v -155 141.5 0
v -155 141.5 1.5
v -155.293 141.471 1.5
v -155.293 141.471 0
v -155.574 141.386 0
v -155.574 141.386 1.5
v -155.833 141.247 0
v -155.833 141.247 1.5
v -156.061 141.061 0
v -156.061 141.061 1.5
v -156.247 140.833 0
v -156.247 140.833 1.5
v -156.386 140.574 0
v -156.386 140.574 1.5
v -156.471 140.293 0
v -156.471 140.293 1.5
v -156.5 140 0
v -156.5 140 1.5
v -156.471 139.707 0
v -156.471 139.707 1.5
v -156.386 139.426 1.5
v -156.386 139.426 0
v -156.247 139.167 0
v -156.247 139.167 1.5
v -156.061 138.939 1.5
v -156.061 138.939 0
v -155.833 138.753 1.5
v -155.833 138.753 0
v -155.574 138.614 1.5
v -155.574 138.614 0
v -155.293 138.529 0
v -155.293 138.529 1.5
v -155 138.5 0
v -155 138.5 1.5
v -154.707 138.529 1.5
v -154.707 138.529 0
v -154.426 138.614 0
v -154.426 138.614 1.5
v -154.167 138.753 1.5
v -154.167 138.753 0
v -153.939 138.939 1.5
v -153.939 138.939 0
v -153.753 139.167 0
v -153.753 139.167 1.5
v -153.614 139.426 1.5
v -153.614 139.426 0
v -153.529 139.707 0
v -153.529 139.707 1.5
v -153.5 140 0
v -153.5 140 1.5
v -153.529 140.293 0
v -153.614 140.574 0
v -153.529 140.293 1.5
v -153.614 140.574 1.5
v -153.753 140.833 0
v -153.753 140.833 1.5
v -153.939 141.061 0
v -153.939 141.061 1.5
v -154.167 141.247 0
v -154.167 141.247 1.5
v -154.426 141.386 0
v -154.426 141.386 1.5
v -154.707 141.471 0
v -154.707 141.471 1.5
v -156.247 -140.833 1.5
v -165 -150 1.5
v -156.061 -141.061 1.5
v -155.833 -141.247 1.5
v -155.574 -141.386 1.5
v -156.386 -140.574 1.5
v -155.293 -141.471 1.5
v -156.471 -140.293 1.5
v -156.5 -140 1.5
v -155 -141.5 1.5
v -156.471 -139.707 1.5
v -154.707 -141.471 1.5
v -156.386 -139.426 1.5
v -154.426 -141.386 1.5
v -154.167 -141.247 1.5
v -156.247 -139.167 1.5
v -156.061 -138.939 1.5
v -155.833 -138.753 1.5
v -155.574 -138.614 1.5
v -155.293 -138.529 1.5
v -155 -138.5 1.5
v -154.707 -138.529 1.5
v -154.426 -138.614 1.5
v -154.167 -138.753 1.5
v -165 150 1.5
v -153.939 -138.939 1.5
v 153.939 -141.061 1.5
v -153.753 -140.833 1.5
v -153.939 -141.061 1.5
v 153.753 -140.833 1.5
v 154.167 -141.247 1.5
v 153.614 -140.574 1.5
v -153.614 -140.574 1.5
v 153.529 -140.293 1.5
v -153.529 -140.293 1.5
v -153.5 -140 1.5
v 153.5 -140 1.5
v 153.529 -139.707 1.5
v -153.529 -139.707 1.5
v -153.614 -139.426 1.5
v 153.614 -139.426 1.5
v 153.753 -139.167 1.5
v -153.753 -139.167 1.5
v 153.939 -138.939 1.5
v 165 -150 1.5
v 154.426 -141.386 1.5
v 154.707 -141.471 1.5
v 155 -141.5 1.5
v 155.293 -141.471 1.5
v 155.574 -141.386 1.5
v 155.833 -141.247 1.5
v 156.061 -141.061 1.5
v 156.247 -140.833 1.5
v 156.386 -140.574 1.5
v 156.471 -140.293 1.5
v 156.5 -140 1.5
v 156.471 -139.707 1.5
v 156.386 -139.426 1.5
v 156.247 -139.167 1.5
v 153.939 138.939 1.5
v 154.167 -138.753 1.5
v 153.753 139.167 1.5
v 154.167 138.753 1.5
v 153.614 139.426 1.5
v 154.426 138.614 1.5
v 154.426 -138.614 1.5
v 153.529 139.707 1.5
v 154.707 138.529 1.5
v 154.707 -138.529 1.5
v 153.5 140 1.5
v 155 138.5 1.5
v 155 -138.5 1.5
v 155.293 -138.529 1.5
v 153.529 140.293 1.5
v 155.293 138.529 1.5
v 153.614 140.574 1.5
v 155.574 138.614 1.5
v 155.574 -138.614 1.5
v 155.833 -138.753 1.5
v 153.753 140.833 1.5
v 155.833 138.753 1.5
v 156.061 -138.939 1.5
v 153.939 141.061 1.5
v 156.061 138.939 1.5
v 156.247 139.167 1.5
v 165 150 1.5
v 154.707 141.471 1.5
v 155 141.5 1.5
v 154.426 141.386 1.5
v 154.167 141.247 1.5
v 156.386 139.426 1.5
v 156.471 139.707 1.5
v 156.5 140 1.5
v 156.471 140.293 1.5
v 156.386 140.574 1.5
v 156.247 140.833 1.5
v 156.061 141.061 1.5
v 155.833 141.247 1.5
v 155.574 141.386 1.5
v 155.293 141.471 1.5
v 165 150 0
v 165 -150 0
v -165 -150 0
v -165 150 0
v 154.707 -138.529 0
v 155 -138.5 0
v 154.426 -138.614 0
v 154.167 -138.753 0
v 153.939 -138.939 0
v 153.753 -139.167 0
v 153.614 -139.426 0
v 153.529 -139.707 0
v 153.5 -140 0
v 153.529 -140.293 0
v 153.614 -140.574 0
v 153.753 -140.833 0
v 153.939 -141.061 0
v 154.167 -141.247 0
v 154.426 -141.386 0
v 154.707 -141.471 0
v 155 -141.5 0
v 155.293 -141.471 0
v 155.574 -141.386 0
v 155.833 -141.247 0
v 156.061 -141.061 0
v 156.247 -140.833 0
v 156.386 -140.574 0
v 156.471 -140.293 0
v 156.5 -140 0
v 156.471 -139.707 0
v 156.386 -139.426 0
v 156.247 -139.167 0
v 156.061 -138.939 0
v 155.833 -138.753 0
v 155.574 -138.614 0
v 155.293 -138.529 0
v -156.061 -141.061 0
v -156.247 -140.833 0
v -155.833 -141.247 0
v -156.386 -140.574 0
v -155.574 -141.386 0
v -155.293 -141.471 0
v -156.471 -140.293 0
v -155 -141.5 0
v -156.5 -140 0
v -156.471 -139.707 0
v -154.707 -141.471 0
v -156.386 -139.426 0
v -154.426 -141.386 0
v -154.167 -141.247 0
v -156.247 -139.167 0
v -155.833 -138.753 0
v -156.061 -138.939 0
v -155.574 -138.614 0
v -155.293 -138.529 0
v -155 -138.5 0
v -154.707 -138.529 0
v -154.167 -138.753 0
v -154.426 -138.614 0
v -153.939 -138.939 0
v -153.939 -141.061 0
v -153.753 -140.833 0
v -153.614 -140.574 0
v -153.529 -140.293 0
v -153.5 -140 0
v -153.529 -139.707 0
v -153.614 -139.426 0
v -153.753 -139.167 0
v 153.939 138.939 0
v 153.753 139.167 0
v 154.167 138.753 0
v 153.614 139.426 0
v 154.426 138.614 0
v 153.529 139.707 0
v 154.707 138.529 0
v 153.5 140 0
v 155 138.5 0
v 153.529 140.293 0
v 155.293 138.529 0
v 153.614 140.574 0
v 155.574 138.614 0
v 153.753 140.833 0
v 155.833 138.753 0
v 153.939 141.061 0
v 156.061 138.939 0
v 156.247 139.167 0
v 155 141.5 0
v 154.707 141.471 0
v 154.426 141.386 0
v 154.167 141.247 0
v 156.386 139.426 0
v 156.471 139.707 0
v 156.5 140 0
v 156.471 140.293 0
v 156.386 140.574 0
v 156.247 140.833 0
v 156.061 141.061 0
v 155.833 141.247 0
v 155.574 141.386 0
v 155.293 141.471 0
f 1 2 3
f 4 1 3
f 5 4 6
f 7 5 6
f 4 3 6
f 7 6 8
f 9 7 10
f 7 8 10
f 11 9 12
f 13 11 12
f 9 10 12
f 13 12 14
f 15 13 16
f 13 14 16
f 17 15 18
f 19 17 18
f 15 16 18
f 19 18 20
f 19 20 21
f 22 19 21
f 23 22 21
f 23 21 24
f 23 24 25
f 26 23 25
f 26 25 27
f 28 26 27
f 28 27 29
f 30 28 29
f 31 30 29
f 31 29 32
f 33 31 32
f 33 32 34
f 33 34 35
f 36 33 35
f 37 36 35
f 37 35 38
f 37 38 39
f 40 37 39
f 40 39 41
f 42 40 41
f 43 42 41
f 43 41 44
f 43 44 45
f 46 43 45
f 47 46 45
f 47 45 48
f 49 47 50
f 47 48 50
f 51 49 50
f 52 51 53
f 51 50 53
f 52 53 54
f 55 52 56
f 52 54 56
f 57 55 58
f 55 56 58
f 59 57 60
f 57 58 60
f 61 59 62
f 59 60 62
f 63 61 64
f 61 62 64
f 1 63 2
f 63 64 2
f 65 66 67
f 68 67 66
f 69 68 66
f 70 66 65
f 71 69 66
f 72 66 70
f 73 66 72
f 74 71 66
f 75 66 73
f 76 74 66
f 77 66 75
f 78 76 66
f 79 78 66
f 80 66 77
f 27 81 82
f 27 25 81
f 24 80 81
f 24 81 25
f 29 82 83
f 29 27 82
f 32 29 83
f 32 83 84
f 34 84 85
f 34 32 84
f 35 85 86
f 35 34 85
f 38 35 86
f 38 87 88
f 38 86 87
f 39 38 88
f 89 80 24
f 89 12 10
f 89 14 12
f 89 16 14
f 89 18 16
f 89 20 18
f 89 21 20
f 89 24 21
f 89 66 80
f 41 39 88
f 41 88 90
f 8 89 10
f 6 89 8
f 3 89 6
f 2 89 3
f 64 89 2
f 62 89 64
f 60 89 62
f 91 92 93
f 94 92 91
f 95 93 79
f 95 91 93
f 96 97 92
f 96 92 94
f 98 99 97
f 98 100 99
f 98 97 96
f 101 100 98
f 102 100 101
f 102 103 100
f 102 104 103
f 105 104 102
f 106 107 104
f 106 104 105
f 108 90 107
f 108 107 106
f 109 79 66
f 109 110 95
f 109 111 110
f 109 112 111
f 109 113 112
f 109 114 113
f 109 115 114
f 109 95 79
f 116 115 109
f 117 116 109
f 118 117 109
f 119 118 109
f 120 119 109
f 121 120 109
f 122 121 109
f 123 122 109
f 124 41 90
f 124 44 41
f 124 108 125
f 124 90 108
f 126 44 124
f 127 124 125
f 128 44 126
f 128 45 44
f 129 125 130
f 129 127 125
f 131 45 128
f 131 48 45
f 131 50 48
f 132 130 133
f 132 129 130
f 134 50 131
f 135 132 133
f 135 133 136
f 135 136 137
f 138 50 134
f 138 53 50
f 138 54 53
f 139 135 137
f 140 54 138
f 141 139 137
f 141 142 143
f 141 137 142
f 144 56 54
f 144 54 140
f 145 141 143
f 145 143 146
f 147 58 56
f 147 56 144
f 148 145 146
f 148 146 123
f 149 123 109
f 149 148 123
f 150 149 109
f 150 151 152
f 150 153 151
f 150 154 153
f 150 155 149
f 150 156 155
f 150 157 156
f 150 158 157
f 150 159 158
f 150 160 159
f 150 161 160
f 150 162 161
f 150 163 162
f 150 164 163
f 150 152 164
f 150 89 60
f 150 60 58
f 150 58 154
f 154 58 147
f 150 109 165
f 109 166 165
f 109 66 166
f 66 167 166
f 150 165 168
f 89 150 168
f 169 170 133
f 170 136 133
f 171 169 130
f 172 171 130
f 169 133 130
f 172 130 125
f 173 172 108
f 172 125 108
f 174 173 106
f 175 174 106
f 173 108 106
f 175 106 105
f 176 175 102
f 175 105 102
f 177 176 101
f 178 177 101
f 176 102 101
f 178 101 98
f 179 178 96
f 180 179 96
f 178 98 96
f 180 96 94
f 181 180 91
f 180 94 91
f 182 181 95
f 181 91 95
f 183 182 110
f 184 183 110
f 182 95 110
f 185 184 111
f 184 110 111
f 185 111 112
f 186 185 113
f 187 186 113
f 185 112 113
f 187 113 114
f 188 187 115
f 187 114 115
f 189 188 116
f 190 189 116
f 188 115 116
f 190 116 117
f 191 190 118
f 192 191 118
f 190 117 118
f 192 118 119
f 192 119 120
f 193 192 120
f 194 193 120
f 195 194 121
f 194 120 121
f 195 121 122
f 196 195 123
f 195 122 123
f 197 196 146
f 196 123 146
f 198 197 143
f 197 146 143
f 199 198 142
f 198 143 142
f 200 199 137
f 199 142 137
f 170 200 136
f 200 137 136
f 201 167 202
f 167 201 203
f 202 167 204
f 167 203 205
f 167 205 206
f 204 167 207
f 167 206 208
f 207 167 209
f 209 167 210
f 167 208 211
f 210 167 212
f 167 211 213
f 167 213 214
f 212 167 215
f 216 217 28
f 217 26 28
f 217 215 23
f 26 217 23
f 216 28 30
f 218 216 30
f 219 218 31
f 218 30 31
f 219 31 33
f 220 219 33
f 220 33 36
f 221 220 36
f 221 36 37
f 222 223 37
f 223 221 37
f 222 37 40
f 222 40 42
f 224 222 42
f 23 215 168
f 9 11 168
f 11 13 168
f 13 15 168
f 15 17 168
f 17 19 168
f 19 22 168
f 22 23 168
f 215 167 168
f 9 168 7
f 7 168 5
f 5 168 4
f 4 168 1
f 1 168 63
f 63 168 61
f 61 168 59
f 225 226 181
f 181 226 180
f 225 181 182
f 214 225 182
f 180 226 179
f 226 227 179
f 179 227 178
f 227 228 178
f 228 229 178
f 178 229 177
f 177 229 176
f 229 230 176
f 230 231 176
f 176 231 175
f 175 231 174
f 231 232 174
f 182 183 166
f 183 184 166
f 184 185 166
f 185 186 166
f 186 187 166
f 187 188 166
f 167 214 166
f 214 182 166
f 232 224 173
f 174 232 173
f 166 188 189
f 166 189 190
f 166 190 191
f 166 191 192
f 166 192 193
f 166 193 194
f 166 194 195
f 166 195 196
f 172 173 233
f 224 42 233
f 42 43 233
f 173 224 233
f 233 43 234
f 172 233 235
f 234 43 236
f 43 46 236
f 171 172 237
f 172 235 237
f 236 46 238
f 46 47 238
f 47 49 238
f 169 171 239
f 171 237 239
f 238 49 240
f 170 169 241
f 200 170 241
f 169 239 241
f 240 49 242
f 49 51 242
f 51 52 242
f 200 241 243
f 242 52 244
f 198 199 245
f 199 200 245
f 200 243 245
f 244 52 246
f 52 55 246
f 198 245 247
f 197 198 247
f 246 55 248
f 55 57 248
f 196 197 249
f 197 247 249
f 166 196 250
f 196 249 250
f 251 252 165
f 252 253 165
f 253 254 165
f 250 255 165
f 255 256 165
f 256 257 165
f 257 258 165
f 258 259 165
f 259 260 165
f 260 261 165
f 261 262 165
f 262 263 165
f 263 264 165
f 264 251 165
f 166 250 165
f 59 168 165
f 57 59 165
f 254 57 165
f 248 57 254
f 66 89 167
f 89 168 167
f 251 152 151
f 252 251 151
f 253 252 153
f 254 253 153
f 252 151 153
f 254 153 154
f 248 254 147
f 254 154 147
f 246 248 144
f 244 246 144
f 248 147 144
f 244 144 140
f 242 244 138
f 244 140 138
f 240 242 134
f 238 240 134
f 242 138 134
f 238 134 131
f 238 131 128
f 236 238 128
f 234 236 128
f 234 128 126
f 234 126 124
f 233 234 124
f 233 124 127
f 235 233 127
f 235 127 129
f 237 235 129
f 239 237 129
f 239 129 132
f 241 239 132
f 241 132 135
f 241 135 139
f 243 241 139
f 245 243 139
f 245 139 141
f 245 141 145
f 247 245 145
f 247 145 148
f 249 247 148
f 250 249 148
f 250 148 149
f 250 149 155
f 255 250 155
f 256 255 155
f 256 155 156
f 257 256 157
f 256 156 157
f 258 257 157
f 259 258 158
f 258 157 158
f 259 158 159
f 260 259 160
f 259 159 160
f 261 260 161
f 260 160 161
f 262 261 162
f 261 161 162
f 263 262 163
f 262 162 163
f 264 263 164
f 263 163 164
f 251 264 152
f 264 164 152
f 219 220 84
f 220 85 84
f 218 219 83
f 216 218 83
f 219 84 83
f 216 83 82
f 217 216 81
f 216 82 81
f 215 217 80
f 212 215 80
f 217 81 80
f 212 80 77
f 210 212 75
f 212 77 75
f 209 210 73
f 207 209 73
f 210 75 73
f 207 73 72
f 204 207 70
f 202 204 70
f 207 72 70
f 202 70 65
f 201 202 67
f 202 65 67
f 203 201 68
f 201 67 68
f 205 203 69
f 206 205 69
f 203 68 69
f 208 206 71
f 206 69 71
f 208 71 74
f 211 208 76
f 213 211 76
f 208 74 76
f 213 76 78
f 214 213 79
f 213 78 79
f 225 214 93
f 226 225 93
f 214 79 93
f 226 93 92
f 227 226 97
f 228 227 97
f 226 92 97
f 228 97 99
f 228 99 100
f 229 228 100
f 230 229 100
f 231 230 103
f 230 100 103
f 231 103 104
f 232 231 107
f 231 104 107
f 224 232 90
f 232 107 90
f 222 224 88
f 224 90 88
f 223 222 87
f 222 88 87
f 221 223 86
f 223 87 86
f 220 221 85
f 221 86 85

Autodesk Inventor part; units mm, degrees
ref_plane "YZ Plane" through (0, 0, 0) normal (1, 0, 0) x (0, 1, 0)
ref_plane "XZ Plane" through (0, 0, 0) normal (0, 1, 0) x (-1, 0, 0)
ref_plane "XY Plane" through (0, 0, 0) normal (0, 0, 1) x (1, 0, 0)
sketch "Sketch1" plane through (0, 0, 0) normal (0, 0, 1) x (1, 0, 0)
  line L0 (-165, -150) -> (165, -150)
  line L1 (165, -150) -> (165, 150)
  line L2 (165, 150) -> (-165, 150)
  line L3 (-165, 150) -> (-165, -150)
  line L4 (-165, -150) -> (165, 150) construction
  line L5 (165, -150) -> (-165, 150) construction
  line L6 (-155, -140) -> (155, -140) construction
  line L7 (155, -140) -> (155, 140) construction
  line L8 (155, 140) -> (-155, 140) construction
  line L9 (-155, 140) -> (-155, -140) construction
  line L10 (-155, -140) -> (155, 140) construction
  line L11 (155, -140) -> (-155, 140) construction
  point P0 (0, 0)
  dimension "d0" = 330
  dimension "d1" = 300
  dimension "d4" = 310
  dimension "d5" = 280
extrude "Extrusion1" add sketch "Sketch1" along normal blind 1.5
hole "Hole1" at (-155, 140, 0) at (-155, -140, 0) at (155, -140, 0) at (155, 140, 0) direction (0, 0, 1) diameter 3 end through all
properties part number "haetbed300"
